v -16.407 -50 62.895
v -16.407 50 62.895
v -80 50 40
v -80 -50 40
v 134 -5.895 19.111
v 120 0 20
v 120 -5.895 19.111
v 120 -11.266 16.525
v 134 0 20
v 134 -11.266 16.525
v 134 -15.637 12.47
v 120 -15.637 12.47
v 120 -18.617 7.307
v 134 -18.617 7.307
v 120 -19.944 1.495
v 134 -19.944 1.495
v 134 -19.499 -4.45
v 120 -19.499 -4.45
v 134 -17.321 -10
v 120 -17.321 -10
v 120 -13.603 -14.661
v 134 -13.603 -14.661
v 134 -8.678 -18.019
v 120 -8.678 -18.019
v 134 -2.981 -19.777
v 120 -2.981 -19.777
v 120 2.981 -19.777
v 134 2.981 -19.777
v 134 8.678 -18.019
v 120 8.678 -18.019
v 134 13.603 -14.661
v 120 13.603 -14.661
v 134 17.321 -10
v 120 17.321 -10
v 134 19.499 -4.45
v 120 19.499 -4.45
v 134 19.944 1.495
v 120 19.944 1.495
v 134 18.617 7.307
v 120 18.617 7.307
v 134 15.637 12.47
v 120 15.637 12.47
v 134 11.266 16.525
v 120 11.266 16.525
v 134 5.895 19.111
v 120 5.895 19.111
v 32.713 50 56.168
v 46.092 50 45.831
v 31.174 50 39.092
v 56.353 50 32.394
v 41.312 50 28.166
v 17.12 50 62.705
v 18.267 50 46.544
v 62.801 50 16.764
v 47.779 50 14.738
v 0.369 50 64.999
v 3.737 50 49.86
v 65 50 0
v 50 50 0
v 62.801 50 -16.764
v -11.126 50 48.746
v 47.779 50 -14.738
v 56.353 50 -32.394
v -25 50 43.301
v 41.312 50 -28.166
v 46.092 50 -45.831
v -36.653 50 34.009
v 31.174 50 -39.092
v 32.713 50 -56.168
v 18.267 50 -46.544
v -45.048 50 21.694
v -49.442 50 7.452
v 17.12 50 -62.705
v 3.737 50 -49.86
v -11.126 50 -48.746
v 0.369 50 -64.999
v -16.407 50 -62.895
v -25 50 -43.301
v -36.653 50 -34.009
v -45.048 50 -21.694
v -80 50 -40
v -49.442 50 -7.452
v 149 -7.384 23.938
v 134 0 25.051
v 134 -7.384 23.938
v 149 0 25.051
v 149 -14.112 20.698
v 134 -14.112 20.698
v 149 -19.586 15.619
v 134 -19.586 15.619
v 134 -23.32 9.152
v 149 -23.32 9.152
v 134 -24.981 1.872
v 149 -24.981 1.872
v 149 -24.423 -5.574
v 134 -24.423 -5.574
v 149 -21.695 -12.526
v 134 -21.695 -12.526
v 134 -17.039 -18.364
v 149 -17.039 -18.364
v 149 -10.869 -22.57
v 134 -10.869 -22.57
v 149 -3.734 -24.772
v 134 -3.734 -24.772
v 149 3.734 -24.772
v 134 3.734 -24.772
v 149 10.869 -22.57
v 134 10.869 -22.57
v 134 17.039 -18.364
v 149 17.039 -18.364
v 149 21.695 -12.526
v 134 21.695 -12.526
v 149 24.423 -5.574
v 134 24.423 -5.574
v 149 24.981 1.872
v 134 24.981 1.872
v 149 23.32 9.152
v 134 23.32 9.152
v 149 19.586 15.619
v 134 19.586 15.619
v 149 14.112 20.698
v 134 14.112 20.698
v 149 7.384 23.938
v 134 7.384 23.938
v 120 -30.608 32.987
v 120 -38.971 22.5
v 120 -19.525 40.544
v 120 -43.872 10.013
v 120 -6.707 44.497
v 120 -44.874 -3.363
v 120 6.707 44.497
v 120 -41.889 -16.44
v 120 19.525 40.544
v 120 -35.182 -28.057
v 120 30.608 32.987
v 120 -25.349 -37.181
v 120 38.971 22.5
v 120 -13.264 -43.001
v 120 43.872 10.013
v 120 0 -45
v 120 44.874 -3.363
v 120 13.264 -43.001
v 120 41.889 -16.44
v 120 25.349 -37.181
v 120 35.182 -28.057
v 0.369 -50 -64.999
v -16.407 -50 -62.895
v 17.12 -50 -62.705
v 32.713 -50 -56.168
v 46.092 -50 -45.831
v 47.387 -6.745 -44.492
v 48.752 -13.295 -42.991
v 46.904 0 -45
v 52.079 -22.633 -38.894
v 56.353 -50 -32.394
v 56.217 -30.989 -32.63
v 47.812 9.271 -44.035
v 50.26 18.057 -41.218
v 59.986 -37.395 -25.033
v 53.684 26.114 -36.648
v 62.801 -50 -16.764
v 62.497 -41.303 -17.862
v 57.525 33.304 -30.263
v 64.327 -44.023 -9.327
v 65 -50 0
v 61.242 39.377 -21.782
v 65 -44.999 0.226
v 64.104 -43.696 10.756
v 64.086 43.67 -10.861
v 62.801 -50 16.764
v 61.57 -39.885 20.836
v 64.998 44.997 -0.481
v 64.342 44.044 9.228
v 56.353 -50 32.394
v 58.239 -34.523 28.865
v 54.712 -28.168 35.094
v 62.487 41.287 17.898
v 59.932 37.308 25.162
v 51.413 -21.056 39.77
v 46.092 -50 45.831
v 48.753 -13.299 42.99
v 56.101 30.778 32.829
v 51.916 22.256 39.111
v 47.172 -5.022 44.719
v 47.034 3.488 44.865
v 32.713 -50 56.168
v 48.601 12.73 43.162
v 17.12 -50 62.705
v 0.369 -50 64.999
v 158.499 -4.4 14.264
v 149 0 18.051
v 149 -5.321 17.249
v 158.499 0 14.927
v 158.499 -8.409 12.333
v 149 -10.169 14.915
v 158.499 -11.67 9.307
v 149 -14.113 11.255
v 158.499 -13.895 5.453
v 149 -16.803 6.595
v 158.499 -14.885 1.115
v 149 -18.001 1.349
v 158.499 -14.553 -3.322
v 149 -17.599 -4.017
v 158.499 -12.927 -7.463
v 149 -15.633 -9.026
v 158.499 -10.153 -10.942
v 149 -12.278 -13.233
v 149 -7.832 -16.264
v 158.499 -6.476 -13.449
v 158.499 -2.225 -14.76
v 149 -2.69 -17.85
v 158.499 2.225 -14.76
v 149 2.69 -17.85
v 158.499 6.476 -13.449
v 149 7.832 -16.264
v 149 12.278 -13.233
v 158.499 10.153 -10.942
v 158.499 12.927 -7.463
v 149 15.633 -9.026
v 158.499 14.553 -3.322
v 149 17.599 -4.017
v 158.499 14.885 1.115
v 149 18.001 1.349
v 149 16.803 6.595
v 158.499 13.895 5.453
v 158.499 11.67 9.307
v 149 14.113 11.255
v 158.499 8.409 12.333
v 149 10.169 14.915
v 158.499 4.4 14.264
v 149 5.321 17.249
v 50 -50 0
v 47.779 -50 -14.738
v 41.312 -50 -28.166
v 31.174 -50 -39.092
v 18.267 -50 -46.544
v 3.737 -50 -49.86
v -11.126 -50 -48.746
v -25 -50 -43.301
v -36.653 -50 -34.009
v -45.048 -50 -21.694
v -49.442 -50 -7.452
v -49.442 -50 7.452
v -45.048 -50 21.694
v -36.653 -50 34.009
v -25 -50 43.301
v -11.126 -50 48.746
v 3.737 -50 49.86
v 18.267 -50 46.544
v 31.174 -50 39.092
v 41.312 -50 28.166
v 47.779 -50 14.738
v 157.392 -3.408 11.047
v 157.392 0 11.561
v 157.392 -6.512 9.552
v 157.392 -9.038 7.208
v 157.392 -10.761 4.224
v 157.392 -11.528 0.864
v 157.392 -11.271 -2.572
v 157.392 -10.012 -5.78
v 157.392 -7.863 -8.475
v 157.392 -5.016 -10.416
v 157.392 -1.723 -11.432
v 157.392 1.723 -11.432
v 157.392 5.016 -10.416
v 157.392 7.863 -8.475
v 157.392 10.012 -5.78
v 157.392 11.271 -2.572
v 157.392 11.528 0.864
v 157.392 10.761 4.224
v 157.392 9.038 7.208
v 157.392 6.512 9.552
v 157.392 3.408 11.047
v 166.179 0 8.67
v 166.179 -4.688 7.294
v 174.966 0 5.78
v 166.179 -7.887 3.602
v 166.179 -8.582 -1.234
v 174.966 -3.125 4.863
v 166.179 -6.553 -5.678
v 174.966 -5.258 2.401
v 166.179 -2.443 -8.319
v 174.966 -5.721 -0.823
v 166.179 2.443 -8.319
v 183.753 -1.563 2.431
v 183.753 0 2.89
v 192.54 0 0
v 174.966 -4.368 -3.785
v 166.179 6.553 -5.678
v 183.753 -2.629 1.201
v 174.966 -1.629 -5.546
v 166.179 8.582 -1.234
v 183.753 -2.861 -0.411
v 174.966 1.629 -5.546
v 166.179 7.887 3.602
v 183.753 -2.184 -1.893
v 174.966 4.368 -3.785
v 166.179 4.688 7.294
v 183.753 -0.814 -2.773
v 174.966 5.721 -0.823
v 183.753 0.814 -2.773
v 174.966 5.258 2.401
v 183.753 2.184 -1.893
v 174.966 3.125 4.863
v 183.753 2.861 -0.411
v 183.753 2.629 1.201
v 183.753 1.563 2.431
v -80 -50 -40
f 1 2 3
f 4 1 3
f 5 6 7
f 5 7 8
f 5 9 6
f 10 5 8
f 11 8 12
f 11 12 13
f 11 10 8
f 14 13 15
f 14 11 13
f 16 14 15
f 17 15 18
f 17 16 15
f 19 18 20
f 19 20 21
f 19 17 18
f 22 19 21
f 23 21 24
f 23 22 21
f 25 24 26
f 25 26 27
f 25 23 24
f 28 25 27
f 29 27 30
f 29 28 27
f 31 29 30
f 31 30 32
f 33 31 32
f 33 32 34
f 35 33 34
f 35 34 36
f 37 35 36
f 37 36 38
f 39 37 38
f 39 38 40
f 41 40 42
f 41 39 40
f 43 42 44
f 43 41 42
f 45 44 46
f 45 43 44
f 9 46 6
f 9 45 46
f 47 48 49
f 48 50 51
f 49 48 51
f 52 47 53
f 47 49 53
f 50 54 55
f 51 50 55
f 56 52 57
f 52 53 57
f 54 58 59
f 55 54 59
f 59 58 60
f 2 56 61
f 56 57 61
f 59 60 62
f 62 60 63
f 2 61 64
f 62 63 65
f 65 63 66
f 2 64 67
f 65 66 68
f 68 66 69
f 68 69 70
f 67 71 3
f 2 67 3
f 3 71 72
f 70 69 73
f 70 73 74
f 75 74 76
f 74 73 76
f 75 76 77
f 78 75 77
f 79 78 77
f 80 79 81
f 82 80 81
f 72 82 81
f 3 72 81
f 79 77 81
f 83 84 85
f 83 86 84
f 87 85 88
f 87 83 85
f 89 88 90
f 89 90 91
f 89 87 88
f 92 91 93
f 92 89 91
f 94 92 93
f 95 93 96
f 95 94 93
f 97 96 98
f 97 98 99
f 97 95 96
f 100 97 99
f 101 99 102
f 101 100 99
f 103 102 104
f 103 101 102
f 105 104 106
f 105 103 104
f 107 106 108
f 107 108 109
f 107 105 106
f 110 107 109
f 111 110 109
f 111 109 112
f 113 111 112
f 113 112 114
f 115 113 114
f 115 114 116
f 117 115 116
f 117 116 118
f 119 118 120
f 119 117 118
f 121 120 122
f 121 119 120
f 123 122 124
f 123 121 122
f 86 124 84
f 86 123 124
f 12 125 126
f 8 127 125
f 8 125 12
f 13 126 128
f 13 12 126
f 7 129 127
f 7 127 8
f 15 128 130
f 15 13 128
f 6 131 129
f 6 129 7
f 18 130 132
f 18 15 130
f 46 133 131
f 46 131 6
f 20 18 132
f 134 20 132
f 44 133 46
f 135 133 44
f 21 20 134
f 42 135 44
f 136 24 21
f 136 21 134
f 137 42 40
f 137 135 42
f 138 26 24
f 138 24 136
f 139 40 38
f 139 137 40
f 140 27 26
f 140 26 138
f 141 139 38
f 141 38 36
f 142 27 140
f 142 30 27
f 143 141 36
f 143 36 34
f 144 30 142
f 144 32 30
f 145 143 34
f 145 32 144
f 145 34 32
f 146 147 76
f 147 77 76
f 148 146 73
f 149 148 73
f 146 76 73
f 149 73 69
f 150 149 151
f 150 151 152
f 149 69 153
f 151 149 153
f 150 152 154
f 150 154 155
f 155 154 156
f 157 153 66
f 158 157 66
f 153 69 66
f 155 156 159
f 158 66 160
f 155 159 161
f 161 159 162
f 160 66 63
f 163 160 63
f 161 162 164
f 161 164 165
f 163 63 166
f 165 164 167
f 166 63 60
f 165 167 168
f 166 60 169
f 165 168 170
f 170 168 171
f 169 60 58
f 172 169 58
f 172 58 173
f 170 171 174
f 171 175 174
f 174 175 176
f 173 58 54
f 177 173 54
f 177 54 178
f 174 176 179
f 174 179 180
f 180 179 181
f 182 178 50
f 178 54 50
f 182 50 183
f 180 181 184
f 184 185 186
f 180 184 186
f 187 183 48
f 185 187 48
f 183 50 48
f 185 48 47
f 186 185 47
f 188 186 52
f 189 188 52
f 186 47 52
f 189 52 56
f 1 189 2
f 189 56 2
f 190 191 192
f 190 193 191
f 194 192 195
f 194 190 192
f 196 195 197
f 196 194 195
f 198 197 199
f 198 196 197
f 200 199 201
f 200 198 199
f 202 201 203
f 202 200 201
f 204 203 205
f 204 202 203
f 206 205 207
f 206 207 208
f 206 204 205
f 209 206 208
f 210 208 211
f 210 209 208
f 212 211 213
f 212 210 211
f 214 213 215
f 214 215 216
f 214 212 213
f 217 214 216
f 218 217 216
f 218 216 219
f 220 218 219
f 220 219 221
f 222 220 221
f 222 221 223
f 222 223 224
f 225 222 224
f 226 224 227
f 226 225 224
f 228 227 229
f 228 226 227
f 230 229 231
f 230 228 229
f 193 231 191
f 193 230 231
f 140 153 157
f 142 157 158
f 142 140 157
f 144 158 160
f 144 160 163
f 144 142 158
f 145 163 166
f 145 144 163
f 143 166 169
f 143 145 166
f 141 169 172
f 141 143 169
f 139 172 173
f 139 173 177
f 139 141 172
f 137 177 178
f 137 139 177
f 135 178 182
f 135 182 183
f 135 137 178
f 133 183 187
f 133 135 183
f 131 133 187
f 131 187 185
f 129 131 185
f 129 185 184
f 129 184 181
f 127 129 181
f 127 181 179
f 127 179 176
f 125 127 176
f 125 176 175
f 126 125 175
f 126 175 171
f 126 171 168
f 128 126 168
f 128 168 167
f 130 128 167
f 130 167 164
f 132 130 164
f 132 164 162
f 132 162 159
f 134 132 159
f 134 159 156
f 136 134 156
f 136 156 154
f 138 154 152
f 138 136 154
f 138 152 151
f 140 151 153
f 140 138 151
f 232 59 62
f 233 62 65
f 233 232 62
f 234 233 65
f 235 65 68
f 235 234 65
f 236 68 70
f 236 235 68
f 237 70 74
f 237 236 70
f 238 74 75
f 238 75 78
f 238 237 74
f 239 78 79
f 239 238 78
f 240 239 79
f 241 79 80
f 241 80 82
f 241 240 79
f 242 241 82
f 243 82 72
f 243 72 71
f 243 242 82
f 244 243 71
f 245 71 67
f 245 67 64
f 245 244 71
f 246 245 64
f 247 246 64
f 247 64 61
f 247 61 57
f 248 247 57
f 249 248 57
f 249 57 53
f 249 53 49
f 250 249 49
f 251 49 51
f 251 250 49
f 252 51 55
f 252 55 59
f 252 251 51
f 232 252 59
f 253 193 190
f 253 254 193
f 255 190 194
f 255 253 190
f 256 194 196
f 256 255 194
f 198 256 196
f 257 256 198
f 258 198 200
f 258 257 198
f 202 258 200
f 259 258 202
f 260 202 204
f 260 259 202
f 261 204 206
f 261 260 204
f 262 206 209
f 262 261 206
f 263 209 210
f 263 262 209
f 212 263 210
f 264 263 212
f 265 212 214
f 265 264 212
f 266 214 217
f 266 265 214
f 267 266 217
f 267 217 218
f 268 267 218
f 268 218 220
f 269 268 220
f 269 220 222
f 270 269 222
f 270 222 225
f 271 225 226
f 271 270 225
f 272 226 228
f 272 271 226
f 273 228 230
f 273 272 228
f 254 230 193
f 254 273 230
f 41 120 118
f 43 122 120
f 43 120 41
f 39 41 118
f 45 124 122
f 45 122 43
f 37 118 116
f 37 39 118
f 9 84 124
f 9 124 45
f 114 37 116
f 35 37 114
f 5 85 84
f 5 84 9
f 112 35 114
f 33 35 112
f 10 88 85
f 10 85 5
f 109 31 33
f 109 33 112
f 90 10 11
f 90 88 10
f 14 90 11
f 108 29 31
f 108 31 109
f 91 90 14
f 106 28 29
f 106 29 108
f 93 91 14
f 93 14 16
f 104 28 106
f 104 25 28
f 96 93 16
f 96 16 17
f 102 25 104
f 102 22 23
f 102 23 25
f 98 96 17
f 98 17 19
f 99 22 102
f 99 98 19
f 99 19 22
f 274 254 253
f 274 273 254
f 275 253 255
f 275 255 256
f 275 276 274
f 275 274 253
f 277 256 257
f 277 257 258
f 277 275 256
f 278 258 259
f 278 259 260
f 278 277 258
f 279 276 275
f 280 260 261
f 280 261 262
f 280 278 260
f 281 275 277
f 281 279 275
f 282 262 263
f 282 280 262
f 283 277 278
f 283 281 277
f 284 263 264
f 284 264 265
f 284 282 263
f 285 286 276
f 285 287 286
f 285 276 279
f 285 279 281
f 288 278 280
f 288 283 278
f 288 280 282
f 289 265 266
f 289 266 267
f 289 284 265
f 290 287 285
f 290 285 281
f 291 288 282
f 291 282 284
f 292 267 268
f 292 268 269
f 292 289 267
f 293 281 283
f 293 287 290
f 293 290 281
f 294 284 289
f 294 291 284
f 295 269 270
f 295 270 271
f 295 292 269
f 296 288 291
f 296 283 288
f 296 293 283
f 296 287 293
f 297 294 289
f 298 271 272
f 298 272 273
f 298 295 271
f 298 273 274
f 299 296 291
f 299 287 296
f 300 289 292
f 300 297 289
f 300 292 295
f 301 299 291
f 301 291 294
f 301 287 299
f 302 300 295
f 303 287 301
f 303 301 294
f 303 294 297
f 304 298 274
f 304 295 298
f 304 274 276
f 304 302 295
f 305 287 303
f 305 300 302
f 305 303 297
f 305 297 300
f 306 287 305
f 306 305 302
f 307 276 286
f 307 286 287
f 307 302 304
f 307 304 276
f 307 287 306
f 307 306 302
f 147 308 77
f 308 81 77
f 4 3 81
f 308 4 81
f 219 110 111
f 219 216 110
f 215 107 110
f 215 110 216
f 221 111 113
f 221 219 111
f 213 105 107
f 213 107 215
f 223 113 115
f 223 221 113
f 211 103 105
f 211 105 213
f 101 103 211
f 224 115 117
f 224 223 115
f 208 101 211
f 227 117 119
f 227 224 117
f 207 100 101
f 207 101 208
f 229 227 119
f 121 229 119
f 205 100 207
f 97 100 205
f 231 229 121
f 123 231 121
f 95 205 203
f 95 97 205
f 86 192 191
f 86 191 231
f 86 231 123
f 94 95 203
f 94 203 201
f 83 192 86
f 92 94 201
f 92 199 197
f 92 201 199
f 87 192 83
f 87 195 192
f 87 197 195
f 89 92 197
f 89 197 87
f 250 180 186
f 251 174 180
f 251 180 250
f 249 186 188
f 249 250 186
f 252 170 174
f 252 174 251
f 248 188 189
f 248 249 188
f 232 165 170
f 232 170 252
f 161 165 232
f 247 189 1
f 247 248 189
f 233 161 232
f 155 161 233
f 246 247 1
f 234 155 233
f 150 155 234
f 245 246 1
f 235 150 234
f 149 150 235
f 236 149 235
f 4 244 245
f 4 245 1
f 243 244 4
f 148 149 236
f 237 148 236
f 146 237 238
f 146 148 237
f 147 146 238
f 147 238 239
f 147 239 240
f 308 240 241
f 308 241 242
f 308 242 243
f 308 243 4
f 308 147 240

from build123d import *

# Parameters (mm, degrees)
SKETCH1_R           = 50
BOSS_EXTRUDE1_DEPTH = 50
BOSS_EXTRUDE2_REACH = 202
SKETCH2_R           = 45


with BuildPart() as part:
    # Sketch1 → Boss-Extrude1 (new body, symmetric)
    with BuildSketch(Plane(origin=(0, 0, 0), x_dir=(1, 0, 0), z_dir=(0, 1, 0))):
        with BuildLine():
            Line((-80, -40), (-80, 40))
            Line((-80, 40), (-16.407423315, 62.895122706))
            ThreePointArc((-16.407423315, 62.895122706), (65, 0), (-16.407423315, -62.895122706))
            Line((-16.407423315, -62.895122706), (-80, -40))
        make_face()
        Circle(SKETCH1_R, mode=Mode.SUBTRACT)
    extrude(amount=BOSS_EXTRUDE1_DEPTH, both=True)

    # Sketch2 → Boss-Extrude2 (add, up to next)
    with BuildSketch(Plane(origin=(120, 0, 0), x_dir=(0, 0, -1), z_dir=(1, 0, 0)), mode=Mode.PRIVATE) as boss_extrude2_sk1:
        Circle(SKETCH2_R)
    boss_extrude2_tool1 = extrude(boss_extrude2_sk1.sketch, amount=-BOSS_EXTRUDE2_REACH, mode=Mode.PRIVATE) - part.part
    add(boss_extrude2_tool1.solids().sort_by_distance((120, 0, 0))[0])

    # Sketch3 → Revolve1 (revolve)
    with BuildSketch(Plane(origin=(0, 0, 0), x_dir=(1, 0, 0), z_dir=(0, 1, 0))):
        Polygon((120, 0), (120, -20), (134, -20), (134, -25.051306185), (149, -25.051306185), (149, -18.051306185), (158.499342873, -14.926808627), (157.392152325, -11.560640965), (192.539720953, 0), align=None)
    revolve(axis=Axis((0, 0, 0), (1, 0, 0)))


solid = part.part
